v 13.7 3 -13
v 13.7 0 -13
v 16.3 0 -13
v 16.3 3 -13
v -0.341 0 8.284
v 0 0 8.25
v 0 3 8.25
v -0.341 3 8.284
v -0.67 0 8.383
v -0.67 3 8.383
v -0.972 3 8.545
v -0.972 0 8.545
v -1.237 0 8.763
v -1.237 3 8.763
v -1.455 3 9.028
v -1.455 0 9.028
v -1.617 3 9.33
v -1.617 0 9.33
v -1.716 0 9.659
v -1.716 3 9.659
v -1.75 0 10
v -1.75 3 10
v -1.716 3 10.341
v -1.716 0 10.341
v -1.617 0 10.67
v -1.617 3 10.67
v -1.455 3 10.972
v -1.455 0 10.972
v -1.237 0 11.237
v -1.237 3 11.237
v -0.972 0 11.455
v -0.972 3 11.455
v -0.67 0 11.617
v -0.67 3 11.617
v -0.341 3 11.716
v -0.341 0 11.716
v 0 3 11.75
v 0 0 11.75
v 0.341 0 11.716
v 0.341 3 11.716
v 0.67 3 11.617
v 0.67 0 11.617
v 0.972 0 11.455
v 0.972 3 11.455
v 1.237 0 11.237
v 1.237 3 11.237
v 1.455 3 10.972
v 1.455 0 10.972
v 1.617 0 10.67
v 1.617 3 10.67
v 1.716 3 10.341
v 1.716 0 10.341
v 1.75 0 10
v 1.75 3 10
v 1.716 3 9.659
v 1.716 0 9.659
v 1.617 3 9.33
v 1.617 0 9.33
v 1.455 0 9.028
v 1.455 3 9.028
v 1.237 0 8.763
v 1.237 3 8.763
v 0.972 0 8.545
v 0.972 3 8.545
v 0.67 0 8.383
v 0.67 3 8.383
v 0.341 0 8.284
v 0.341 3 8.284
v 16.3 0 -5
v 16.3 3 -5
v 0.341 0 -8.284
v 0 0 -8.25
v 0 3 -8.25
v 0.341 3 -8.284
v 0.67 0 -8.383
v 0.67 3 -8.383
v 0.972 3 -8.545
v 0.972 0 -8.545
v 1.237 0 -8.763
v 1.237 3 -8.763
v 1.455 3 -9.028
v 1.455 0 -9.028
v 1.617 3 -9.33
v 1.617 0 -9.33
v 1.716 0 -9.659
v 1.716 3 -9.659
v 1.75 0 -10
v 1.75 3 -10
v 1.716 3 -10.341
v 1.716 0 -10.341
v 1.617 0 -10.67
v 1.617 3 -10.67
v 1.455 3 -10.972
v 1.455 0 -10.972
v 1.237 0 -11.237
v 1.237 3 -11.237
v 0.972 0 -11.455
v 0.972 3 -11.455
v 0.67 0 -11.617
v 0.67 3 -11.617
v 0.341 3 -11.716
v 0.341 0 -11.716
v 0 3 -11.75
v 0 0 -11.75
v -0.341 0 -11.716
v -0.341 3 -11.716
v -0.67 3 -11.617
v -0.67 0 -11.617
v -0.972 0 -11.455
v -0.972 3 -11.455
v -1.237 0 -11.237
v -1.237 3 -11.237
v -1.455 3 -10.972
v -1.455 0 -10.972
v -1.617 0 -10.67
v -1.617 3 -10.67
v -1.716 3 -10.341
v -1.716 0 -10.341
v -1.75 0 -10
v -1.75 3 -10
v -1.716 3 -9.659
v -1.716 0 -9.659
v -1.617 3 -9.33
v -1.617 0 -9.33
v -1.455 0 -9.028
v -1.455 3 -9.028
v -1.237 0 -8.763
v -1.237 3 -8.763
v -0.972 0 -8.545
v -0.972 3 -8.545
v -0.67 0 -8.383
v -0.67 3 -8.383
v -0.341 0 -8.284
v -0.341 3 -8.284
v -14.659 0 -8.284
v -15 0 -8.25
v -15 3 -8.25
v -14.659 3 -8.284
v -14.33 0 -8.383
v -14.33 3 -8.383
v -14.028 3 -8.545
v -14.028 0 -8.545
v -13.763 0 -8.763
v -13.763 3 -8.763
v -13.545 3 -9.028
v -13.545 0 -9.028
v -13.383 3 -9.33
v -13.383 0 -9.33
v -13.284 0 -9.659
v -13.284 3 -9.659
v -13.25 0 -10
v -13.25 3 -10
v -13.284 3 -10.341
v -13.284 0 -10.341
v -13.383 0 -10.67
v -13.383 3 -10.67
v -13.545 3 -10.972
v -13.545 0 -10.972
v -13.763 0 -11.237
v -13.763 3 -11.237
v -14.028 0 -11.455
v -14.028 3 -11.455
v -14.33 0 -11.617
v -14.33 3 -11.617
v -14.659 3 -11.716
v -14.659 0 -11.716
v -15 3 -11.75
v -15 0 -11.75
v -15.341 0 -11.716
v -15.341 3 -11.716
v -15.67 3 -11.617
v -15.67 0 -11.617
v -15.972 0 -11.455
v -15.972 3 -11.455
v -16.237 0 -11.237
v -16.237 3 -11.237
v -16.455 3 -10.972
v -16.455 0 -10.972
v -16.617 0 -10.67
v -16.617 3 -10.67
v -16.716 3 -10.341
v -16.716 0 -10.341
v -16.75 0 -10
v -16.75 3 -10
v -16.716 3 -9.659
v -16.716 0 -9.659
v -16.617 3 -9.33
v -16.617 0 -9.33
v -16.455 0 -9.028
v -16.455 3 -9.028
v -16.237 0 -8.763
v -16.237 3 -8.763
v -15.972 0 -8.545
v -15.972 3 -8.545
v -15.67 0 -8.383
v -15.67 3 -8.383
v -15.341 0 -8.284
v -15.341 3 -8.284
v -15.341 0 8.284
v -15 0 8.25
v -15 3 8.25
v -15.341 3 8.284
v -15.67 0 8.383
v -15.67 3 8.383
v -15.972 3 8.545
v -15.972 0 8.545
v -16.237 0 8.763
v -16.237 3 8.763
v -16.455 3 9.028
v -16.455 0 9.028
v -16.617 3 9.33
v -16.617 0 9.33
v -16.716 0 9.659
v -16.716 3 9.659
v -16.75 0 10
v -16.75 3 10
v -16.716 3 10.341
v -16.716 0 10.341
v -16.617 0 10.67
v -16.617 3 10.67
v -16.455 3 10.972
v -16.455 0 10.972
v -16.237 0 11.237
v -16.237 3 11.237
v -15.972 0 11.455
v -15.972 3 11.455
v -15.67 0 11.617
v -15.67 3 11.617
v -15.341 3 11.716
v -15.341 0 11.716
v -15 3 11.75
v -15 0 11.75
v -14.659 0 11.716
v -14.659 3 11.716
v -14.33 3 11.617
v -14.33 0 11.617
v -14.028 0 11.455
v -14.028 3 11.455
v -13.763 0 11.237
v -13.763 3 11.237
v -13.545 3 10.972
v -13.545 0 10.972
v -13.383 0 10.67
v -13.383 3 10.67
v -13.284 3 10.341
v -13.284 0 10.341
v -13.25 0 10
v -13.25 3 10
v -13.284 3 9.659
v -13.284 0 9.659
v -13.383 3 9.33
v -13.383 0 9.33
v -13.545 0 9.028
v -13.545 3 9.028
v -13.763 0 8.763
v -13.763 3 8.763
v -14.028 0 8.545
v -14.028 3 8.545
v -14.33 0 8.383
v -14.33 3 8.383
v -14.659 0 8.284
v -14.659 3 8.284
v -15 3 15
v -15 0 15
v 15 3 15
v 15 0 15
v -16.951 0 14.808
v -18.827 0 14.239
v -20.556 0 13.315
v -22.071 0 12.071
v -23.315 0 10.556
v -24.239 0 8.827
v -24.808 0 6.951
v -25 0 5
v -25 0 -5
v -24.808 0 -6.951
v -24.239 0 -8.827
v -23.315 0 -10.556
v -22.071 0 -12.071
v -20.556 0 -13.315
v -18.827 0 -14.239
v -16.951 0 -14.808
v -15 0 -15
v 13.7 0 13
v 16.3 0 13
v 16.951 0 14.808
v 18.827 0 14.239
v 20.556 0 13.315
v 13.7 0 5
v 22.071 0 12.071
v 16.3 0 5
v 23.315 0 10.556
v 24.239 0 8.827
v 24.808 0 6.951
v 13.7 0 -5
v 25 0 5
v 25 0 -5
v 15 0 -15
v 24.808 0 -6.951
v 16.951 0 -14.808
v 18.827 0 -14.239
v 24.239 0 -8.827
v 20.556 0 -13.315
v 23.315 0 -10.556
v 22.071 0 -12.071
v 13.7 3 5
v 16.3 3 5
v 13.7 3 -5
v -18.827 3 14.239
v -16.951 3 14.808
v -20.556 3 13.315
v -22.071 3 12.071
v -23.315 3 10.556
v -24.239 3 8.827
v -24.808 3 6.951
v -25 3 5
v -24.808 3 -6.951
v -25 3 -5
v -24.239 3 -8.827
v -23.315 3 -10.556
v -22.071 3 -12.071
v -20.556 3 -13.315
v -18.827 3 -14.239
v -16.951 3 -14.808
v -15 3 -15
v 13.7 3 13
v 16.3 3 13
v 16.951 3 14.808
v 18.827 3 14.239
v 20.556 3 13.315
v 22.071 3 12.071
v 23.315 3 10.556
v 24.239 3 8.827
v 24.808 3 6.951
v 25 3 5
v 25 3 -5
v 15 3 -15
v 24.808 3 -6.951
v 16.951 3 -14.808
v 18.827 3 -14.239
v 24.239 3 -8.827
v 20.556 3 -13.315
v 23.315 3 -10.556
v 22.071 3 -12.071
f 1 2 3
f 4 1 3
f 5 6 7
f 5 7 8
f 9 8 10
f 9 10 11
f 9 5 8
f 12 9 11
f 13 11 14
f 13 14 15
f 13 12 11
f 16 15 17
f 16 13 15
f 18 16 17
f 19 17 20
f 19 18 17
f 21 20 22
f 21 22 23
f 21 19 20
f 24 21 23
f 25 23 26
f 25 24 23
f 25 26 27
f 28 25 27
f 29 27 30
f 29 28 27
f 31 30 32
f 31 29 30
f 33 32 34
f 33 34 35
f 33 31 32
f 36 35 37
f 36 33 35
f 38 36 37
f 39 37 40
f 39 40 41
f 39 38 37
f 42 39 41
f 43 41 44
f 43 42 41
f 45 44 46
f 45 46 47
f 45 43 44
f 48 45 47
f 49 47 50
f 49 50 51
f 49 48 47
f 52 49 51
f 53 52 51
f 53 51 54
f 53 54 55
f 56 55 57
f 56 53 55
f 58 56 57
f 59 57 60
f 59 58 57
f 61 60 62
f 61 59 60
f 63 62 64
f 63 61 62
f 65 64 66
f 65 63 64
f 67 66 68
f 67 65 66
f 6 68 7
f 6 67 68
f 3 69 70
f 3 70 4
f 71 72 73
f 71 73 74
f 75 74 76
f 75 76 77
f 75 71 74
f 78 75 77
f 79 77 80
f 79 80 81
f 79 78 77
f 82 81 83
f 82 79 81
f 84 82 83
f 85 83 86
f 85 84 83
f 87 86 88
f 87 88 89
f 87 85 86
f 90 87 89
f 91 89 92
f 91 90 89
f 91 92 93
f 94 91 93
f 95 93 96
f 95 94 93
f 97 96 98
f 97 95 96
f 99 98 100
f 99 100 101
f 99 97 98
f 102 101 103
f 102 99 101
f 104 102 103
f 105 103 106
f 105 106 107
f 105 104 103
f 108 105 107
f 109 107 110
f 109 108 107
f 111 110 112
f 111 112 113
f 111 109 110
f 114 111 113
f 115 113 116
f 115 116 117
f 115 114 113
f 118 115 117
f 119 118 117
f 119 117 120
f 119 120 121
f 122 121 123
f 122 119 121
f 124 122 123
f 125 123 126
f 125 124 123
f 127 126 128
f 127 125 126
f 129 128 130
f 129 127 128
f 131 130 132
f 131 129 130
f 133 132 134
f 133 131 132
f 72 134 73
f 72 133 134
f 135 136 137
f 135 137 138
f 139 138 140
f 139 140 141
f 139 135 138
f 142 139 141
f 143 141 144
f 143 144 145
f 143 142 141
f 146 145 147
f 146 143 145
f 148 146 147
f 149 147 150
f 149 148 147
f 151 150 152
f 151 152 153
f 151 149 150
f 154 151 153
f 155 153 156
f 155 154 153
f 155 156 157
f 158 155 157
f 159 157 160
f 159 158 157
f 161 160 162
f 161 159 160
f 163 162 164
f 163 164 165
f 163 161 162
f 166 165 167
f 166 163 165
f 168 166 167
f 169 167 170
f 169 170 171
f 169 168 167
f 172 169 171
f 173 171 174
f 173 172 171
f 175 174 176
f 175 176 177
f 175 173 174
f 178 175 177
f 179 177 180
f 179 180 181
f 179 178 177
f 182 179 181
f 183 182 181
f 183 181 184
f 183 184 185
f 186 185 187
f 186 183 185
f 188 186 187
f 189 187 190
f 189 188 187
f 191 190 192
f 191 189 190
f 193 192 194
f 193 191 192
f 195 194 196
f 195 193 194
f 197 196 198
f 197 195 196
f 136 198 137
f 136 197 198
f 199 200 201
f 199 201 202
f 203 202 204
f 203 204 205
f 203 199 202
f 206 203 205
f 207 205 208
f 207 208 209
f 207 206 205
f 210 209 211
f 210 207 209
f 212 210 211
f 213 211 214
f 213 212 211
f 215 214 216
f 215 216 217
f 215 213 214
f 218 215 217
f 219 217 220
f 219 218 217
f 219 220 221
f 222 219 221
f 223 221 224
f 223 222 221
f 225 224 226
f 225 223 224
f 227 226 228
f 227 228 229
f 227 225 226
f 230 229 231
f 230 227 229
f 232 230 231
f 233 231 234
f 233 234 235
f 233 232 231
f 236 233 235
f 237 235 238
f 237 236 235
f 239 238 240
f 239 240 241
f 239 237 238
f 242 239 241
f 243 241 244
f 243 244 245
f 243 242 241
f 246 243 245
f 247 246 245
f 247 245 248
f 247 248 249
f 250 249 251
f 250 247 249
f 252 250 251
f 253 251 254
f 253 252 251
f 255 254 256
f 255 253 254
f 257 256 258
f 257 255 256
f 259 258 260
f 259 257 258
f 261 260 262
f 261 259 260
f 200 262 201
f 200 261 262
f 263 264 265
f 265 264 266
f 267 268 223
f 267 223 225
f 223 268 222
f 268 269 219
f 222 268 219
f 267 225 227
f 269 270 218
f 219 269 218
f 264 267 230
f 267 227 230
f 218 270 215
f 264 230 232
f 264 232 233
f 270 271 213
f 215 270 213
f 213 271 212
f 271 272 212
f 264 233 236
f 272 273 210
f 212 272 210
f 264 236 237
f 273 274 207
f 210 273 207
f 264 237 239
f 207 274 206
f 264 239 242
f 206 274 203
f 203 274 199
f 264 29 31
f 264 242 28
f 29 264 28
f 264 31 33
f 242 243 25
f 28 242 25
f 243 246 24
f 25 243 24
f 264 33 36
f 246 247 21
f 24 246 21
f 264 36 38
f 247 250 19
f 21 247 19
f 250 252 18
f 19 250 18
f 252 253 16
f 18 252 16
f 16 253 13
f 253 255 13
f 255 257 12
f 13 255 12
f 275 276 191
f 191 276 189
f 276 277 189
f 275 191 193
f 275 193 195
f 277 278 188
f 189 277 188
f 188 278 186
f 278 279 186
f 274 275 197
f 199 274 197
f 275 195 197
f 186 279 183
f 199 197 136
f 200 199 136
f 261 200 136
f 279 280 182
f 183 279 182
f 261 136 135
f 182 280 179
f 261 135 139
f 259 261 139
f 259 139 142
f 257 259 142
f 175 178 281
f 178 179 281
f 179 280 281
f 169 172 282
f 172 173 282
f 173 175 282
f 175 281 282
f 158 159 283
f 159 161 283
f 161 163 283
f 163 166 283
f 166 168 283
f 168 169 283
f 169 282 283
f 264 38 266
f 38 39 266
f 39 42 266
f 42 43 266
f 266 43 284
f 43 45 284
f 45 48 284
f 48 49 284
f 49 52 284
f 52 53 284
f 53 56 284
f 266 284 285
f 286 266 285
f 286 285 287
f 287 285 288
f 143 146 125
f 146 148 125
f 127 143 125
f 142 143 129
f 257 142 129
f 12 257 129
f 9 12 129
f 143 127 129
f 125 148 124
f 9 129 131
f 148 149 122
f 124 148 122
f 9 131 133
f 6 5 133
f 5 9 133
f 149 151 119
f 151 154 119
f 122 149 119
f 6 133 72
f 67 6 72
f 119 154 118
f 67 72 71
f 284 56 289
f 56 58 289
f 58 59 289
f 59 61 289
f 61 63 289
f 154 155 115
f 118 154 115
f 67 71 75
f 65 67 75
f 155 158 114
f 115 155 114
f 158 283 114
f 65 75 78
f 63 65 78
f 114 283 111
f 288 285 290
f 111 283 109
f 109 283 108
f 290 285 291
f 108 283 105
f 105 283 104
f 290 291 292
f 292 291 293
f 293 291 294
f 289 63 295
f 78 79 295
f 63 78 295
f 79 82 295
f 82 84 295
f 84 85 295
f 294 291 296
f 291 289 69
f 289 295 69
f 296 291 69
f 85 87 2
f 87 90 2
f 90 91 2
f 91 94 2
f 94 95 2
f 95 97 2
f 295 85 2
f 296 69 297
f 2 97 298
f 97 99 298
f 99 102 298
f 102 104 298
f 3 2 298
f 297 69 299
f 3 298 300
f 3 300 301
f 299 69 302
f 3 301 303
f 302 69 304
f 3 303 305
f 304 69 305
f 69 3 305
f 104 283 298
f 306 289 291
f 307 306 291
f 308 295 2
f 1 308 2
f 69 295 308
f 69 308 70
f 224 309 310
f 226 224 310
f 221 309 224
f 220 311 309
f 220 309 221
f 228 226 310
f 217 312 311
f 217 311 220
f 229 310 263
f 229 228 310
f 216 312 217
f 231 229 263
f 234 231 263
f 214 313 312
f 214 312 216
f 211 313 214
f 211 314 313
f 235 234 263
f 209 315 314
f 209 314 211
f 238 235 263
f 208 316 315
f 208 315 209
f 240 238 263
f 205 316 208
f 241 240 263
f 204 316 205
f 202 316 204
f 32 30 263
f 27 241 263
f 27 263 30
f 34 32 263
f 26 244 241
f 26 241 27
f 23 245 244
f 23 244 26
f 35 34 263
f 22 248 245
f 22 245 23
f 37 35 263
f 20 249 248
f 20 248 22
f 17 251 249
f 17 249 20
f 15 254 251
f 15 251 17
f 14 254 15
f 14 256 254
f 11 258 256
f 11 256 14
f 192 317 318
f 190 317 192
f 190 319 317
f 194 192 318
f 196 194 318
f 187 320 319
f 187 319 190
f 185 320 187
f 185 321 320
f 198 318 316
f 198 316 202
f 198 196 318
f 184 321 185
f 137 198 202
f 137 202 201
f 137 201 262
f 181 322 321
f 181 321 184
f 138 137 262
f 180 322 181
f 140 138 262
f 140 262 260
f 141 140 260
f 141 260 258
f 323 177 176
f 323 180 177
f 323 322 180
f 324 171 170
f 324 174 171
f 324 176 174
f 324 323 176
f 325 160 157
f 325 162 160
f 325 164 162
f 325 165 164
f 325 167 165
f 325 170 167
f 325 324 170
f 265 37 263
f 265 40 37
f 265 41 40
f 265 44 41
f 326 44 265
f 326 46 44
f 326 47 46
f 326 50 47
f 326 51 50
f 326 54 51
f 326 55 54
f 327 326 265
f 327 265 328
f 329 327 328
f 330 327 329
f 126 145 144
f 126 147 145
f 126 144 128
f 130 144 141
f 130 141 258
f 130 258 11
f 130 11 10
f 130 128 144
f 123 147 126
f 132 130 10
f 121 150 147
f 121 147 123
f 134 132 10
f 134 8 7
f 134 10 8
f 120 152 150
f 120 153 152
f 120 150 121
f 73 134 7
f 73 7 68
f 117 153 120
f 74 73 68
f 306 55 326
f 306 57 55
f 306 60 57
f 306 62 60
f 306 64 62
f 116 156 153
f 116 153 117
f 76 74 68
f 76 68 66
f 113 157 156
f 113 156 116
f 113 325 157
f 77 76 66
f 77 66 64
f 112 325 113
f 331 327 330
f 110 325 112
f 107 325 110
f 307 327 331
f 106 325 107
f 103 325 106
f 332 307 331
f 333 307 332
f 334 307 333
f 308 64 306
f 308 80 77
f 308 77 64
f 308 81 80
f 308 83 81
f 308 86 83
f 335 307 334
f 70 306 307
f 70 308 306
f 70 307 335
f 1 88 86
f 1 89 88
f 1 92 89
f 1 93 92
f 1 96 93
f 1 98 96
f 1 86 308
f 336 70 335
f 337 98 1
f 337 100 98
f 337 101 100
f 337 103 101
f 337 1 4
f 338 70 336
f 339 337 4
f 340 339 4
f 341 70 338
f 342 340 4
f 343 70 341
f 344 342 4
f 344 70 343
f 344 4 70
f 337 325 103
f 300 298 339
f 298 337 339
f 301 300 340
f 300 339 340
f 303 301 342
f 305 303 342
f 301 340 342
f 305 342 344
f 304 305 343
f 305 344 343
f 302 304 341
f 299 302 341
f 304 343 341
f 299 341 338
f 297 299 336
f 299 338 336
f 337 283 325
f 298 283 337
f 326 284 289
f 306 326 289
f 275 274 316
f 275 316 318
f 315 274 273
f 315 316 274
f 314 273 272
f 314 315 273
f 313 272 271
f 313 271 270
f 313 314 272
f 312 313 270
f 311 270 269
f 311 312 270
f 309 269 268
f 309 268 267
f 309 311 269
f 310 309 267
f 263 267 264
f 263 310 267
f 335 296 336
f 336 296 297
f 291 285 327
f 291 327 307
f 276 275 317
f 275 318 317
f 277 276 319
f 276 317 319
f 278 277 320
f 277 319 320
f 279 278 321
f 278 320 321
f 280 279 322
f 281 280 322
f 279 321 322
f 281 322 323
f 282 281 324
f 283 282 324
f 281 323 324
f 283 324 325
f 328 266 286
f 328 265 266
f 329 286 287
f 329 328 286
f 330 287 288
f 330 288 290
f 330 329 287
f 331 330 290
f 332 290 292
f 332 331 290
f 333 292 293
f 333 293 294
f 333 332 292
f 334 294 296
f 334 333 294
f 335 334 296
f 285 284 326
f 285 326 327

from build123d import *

# Parameters (mm, degrees)
SKETCH1_W           = 50
SKETCH1_H           = 30
SKETCH1_R           = 1.75
SKETCH1_W_2         = 2.6
SKETCH1_H_2         = 8
BOSS_EXTRUDE2_DEPTH = 3
FILLET1_R           = 10


with BuildPart() as part:
    # Sketch1 → Boss-Extrude2 (new body)
    with BuildSketch(Plane(origin=(0, 0, 0), x_dir=(1, 0, 0), z_dir=(0, 1, 0))):
        Rectangle(SKETCH1_W, SKETCH1_H)
        with Locations(Location((-15, 10, 0), (0, 0, 270))):
            Circle(SKETCH1_R, mode=Mode.SUBTRACT)
        with Locations(Location((0, 10, 0), (0, 0, 270))):
            Circle(SKETCH1_R, mode=Mode.SUBTRACT)
        with Locations(Location((-15, -10, 0), (0, 0, 90))):
            Circle(SKETCH1_R, mode=Mode.SUBTRACT)
        with Locations(Location((0, -10, 0), (0, 0, 90))):
            Circle(SKETCH1_R, mode=Mode.SUBTRACT)
        with Locations((15, -9)):
            Rectangle(SKETCH1_W_2, SKETCH1_H_2, mode=Mode.SUBTRACT)
        with Locations((15, 9)):
            Rectangle(SKETCH1_W_2, SKETCH1_H_2, mode=Mode.SUBTRACT)
    extrude(amount=BOSS_EXTRUDE2_DEPTH)

    # Fillet1
    fillet1_edges = [part.edges().sort_by_distance(p)[0] for p in [
        (-25, 1.5, -15),
        (25, 1.5, -15),
        (25, 1.5, 15),
        (-25, 1.5, 15),
    ]]
    fillet(fillet1_edges, radius=FILLET1_R)


solid = part.part
